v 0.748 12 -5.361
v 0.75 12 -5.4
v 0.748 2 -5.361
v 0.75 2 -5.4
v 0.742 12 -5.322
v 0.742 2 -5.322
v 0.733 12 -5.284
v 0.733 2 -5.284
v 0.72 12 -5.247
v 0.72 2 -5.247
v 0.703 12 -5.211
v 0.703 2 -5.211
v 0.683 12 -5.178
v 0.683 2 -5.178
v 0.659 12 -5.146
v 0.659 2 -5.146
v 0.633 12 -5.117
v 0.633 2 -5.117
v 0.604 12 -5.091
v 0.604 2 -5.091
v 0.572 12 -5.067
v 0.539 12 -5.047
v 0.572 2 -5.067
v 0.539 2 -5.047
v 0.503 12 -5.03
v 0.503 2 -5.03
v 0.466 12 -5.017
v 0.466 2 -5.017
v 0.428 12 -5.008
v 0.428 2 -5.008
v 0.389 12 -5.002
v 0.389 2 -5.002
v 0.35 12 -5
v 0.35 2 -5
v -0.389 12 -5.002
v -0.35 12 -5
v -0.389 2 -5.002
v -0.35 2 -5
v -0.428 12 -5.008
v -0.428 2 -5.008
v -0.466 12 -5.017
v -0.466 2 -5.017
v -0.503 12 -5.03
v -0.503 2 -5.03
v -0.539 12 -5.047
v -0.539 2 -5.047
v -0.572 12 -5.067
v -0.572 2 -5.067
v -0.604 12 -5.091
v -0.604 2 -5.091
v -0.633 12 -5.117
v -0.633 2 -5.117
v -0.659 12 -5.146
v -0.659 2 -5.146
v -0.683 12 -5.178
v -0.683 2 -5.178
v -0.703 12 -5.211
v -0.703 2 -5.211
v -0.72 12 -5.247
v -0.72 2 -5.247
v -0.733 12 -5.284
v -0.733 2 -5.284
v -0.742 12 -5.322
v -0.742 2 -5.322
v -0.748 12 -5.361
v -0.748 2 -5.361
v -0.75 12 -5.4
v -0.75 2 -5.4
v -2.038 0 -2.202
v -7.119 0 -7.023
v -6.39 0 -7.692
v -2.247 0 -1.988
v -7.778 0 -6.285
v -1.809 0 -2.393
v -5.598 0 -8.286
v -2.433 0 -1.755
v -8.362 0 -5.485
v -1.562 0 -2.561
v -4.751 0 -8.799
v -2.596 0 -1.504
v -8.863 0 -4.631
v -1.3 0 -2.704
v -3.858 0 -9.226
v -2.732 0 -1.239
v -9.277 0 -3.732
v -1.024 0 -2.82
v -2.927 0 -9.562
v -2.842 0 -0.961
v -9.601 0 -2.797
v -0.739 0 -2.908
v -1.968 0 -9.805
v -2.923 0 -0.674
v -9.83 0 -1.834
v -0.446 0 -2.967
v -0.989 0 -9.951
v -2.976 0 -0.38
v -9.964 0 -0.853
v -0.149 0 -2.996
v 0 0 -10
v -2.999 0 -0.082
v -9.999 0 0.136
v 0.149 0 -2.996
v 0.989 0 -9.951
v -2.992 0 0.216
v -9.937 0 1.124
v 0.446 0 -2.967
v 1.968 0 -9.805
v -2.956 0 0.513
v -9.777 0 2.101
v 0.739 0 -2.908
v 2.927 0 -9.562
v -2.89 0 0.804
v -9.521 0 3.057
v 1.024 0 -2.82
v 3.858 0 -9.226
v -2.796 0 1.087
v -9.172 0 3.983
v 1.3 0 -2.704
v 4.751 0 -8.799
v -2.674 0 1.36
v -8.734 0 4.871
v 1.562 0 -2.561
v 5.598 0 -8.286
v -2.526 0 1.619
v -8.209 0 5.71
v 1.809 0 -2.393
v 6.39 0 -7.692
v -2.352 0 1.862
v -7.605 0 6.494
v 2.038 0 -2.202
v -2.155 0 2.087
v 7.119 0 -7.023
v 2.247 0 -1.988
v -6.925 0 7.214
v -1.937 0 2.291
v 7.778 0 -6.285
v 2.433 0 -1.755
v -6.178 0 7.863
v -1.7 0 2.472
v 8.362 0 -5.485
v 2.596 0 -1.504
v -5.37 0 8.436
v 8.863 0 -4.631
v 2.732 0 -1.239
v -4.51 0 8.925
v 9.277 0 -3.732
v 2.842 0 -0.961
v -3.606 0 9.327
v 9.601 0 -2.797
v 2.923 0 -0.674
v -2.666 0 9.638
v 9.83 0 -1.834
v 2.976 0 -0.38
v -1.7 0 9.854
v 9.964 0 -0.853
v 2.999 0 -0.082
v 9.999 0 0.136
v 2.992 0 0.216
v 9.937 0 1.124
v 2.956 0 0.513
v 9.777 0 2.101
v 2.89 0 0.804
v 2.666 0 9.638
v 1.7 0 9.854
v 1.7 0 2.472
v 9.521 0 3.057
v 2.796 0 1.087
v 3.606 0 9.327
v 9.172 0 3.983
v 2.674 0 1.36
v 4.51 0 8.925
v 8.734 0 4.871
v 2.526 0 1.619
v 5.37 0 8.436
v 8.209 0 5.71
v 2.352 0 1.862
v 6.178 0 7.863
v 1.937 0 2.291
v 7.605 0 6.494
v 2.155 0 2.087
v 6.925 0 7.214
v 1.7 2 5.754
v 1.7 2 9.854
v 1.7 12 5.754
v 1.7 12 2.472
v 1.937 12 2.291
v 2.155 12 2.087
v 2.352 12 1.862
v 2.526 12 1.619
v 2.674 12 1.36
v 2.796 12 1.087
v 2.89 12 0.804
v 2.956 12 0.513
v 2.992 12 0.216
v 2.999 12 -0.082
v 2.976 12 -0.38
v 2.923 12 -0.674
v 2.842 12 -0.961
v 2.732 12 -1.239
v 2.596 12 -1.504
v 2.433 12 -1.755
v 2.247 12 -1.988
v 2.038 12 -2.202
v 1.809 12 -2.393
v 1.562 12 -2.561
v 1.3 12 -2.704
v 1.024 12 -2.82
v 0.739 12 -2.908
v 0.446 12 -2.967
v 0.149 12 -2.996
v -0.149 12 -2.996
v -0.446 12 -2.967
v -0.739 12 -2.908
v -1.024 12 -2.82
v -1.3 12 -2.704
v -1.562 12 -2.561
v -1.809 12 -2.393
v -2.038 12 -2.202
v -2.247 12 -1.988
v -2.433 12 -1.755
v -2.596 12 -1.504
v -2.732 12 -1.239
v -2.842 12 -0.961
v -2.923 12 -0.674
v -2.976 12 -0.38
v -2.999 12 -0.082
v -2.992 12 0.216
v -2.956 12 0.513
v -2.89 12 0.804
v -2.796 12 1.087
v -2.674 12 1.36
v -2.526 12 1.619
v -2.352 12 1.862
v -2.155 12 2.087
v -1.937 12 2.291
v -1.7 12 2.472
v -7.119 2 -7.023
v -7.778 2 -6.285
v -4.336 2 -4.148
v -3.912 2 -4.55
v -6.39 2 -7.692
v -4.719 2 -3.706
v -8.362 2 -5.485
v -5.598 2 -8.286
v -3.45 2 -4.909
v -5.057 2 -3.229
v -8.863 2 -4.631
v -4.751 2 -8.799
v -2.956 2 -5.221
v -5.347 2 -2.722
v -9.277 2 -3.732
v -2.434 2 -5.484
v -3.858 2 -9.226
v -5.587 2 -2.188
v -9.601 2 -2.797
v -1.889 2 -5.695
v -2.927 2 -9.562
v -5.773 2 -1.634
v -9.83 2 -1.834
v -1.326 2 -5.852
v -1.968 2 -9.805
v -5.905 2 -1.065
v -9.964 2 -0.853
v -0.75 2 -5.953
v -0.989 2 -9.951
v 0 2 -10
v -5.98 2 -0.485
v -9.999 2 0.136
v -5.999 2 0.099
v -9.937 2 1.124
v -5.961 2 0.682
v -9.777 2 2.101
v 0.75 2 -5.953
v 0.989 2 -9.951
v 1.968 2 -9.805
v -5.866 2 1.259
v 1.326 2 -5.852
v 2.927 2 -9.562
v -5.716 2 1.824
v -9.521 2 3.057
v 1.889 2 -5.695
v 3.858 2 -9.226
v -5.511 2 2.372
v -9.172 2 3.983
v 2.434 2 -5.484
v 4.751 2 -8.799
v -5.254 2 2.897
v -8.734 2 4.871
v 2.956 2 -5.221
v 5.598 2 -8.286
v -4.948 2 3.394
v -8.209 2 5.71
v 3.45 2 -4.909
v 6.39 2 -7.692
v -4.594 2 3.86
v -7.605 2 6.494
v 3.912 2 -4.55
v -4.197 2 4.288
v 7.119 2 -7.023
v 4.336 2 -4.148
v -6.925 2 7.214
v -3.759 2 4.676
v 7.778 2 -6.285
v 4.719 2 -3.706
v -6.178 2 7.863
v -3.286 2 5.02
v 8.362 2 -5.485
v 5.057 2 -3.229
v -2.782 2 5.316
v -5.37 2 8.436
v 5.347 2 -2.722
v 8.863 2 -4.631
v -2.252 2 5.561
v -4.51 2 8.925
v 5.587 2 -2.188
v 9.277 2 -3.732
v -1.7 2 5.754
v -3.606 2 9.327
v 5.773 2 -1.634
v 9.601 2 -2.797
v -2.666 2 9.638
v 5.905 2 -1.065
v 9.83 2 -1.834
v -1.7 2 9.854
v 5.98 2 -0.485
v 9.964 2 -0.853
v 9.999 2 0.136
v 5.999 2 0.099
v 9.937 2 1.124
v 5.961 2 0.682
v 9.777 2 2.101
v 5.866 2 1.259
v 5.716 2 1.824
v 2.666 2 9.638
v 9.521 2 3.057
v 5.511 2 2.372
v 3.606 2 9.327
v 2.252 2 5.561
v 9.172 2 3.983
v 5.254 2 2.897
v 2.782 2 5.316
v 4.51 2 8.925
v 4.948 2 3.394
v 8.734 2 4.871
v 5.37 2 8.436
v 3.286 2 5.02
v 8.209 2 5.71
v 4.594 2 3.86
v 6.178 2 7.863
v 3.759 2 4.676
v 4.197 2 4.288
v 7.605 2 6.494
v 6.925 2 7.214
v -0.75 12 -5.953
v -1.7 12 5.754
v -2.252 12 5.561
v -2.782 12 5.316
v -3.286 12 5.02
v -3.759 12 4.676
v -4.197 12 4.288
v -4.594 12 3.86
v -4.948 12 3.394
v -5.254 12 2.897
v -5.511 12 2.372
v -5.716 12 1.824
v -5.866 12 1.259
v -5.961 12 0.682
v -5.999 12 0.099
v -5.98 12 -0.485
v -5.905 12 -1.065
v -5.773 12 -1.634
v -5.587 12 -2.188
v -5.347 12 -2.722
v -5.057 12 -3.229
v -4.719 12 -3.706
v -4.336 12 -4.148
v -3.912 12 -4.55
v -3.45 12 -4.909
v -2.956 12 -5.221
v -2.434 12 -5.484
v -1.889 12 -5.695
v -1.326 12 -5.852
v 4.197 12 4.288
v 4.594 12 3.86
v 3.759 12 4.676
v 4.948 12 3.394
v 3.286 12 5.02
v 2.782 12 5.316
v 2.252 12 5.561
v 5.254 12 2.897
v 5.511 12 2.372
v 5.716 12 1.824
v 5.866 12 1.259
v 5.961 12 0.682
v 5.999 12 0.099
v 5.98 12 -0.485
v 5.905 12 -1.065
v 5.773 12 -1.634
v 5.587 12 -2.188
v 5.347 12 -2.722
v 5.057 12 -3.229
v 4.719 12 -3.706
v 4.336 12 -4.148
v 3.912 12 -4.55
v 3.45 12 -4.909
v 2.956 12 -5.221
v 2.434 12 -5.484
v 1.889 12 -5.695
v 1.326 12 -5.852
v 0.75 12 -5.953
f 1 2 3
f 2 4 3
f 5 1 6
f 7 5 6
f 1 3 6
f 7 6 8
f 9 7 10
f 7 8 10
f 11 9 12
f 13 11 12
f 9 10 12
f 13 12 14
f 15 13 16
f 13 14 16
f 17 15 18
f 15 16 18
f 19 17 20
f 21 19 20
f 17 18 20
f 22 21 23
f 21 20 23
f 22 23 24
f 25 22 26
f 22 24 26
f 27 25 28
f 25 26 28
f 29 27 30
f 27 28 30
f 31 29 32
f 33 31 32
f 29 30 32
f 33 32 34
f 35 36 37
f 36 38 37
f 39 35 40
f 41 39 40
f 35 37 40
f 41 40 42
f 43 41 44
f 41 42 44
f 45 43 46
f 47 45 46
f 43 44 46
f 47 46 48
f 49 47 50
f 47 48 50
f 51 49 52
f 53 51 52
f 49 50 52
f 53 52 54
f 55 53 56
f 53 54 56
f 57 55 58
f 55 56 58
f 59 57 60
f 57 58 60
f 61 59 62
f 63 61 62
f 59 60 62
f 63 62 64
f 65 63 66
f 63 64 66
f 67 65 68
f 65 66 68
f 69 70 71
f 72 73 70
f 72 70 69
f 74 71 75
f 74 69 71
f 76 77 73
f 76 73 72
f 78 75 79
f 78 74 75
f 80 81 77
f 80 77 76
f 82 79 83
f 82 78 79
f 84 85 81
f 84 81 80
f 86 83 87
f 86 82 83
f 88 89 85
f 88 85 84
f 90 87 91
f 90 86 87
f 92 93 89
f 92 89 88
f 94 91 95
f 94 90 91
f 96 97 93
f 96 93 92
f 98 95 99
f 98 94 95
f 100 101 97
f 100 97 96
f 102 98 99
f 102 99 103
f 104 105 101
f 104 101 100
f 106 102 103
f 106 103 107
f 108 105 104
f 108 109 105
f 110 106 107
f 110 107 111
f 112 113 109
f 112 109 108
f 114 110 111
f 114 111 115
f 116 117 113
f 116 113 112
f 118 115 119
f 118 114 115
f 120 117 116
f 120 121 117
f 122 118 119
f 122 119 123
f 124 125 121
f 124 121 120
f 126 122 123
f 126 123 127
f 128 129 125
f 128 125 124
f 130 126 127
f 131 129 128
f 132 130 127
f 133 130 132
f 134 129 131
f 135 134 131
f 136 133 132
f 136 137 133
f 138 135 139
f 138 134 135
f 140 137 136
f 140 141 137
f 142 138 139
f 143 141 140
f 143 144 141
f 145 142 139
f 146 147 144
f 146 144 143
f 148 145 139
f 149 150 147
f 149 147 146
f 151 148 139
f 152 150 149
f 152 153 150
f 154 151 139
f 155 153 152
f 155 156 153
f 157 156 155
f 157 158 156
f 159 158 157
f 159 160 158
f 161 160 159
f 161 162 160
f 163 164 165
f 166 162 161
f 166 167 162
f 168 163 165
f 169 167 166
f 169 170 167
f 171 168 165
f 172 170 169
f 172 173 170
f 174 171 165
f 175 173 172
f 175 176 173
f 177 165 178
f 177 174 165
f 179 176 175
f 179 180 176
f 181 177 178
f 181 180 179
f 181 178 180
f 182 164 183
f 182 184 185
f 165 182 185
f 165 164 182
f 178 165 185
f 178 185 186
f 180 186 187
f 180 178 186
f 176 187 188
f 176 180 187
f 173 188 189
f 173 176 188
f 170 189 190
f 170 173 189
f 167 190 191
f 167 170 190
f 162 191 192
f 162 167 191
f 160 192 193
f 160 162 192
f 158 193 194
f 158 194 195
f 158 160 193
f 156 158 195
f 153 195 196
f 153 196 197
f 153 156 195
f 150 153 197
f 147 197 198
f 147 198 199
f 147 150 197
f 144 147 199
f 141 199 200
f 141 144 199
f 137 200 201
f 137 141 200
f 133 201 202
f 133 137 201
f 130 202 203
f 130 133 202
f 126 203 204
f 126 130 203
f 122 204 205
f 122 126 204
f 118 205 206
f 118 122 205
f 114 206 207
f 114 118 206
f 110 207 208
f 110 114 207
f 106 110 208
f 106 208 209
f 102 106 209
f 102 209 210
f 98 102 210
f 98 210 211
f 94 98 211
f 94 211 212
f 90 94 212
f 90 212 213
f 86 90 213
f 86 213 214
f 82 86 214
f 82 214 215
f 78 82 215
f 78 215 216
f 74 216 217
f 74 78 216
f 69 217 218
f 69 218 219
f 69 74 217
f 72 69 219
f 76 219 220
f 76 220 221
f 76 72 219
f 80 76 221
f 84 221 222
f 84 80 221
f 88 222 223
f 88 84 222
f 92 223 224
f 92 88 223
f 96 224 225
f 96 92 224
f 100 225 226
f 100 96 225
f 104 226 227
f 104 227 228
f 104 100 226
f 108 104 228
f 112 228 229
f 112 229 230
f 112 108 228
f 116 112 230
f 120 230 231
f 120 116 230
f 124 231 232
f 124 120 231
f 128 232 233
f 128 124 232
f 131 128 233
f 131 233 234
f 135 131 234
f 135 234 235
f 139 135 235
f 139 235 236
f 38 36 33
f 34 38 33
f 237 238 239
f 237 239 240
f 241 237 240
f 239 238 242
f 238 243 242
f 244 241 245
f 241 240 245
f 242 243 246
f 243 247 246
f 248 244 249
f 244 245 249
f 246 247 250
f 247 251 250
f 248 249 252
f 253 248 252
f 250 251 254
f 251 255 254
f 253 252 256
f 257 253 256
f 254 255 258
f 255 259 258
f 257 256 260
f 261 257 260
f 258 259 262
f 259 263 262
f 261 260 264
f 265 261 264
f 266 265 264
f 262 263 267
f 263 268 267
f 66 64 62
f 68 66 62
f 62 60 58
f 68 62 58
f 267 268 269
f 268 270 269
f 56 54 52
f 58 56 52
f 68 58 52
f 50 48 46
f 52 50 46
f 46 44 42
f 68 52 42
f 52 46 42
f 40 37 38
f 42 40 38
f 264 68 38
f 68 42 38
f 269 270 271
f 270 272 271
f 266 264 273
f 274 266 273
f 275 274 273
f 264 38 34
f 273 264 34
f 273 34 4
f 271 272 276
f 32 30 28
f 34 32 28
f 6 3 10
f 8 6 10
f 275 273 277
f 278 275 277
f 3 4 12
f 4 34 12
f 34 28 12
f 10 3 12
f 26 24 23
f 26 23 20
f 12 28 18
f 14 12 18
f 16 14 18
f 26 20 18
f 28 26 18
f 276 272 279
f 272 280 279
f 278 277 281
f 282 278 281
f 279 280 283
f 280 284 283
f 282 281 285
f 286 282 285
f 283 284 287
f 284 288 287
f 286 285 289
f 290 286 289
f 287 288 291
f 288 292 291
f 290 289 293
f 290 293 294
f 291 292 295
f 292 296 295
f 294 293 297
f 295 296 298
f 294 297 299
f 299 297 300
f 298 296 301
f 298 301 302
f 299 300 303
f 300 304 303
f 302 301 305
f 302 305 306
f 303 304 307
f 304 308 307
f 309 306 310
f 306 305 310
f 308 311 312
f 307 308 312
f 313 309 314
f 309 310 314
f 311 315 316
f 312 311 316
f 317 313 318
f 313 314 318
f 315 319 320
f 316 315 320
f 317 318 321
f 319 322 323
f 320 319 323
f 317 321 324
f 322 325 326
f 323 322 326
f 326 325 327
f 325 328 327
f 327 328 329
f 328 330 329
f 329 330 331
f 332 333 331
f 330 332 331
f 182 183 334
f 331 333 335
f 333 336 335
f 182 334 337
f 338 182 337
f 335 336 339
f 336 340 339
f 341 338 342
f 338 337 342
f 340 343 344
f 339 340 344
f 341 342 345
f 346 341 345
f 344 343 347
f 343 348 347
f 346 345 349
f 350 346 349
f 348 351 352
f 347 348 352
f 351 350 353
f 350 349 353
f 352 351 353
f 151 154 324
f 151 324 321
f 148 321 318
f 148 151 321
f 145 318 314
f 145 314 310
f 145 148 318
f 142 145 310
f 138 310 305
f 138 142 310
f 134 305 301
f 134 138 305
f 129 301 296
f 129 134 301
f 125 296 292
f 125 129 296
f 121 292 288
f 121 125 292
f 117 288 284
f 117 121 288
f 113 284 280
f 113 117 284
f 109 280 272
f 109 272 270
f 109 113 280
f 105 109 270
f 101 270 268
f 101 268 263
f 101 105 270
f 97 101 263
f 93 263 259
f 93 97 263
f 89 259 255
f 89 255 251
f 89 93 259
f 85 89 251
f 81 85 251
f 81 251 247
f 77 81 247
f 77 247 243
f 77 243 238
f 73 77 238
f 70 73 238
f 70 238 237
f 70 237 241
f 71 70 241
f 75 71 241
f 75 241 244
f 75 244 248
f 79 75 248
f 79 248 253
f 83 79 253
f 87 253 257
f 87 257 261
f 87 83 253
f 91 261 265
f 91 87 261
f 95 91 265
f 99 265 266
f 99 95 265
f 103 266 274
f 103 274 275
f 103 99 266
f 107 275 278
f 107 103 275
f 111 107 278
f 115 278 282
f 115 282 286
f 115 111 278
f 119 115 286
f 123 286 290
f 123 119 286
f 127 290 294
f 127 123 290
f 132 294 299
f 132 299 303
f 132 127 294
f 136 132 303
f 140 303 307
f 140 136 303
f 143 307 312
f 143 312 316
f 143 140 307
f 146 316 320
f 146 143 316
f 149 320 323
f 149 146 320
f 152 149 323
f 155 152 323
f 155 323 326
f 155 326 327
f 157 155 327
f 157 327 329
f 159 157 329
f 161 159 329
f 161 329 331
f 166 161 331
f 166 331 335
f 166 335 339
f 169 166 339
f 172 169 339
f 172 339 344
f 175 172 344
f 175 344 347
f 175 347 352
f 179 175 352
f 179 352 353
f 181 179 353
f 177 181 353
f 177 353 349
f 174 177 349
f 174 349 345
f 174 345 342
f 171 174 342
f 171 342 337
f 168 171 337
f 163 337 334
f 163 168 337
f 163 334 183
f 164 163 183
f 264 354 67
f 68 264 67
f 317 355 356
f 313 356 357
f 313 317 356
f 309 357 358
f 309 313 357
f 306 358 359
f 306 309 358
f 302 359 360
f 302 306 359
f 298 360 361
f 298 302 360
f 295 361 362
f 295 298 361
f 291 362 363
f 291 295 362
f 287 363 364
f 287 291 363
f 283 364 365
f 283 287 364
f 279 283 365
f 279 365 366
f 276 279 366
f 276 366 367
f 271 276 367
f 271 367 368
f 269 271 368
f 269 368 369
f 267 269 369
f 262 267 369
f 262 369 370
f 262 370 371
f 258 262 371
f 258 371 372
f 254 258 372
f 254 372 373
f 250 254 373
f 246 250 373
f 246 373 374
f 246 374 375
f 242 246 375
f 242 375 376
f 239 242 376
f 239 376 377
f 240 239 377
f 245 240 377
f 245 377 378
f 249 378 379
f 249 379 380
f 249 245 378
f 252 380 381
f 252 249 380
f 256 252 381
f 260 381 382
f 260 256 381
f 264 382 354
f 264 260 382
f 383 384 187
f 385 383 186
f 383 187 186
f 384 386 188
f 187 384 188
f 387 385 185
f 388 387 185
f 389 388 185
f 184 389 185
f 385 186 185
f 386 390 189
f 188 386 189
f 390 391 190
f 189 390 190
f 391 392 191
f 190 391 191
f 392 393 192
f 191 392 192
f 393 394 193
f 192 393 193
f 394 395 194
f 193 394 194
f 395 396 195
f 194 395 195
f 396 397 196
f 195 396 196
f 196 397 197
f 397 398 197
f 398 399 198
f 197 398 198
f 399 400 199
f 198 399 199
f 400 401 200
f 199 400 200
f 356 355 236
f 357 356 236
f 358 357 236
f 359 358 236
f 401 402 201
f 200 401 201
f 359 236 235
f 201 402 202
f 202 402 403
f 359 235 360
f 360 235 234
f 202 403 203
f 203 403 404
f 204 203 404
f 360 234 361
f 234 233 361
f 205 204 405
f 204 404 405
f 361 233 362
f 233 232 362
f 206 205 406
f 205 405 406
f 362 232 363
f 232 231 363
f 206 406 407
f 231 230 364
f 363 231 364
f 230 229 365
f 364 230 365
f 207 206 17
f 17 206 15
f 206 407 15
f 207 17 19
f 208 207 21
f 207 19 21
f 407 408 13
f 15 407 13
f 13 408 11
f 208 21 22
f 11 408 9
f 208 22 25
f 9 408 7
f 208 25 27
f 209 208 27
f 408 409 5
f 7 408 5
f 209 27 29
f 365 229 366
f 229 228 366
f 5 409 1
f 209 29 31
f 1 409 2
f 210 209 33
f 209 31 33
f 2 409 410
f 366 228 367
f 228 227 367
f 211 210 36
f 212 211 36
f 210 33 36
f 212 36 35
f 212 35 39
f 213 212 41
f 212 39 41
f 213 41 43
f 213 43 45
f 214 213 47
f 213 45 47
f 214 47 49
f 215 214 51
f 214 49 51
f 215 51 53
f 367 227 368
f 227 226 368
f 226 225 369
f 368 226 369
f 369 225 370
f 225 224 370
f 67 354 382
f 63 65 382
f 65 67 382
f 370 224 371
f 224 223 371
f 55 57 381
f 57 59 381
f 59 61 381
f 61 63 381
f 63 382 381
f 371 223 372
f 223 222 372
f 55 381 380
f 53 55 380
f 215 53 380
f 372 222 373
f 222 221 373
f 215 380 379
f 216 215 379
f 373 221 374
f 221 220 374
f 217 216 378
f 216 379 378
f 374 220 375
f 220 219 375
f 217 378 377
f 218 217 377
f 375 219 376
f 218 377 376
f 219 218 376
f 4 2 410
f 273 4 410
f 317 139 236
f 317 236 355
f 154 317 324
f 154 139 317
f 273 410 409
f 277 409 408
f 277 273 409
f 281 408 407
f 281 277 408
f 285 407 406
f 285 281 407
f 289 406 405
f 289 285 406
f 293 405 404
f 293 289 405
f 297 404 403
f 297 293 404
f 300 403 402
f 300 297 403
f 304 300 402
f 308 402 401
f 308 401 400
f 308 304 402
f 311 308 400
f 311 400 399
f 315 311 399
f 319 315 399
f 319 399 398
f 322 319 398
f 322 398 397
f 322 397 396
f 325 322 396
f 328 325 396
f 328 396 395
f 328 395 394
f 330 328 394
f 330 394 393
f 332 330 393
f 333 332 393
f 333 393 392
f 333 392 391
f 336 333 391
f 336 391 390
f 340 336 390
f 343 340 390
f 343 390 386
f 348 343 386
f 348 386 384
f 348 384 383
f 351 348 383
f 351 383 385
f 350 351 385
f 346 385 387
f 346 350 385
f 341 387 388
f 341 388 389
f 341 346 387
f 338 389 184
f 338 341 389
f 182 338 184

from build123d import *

# Parameters (mm, degrees)
BOSS_EXTRUDE1_DEPTH = 12
BOSS_EXTRUDE2_DEPTH = 2
CUT_EXTRUDE1_DEPTH  = 10
FILLET1_R           = 0.4


with BuildPart() as part:
    # Sketch1 → Boss-Extrude1 (new body)
    with BuildSketch(Plane(origin=(0, 0, 0), x_dir=(1, 0, 0), z_dir=(0, 1, 0))):
        with BuildLine():
            Line((-1.7, -2.471841419), (-1.7, -5.754128952))
            ThreePointArc((-1.7, -5.754128952), (0, 6), (1.7, -5.754128952))
            Line((1.7, -5.754128952), (1.7, -2.471841419))
            ThreePointArc((1.7, -2.471841419), (0, 3), (-1.7, -2.471841419))
        make_face()
    extrude(amount=BOSS_EXTRUDE1_DEPTH)

    # Sketch2 → Boss-Extrude2 (add)
    with BuildSketch(Plane.XZ):
        with BuildLine():
            Line((-1.7, 5.754128952), (-1.7, 9.854440623))
            ThreePointArc((-1.7, 9.854440623), (0, -10), (1.7, 9.854440623))
            Line((1.7, 9.854440623), (1.7, 5.754128952))
            ThreePointArc((1.7, 5.754128952), (0, -6), (-1.7, 5.754128952))
        make_face()
    extrude(amount=-BOSS_EXTRUDE2_DEPTH)

    # Sketch3 → Cut-Extrude1 (cut)
    with BuildSketch(Plane(origin=(0, 12, 0), x_dir=(1, 0, 0), z_dir=(0, 1, 0))):
        with BuildLine():
            Line((-0.75, 5.95294045), (-0.75, 5))
            Line((-0.75, 5), (0.75, 5))
            Line((0.75, 5), (0.75, 5.95294045))
            ThreePointArc((0.75, 5.95294045), (0, 6), (-0.75, 5.95294045))
        make_face()
    extrude(amount=-CUT_EXTRUDE1_DEPTH, mode=Mode.SUBTRACT)

    # Fillet1
    fillet1_edges = [part.edges().sort_by_distance(p)[0] for p in [
        (-0.75, 7, -5),
        (0.75, 7, -5),
    ]]
    fillet(fillet1_edges, radius=FILLET1_R)


solid = part.part
